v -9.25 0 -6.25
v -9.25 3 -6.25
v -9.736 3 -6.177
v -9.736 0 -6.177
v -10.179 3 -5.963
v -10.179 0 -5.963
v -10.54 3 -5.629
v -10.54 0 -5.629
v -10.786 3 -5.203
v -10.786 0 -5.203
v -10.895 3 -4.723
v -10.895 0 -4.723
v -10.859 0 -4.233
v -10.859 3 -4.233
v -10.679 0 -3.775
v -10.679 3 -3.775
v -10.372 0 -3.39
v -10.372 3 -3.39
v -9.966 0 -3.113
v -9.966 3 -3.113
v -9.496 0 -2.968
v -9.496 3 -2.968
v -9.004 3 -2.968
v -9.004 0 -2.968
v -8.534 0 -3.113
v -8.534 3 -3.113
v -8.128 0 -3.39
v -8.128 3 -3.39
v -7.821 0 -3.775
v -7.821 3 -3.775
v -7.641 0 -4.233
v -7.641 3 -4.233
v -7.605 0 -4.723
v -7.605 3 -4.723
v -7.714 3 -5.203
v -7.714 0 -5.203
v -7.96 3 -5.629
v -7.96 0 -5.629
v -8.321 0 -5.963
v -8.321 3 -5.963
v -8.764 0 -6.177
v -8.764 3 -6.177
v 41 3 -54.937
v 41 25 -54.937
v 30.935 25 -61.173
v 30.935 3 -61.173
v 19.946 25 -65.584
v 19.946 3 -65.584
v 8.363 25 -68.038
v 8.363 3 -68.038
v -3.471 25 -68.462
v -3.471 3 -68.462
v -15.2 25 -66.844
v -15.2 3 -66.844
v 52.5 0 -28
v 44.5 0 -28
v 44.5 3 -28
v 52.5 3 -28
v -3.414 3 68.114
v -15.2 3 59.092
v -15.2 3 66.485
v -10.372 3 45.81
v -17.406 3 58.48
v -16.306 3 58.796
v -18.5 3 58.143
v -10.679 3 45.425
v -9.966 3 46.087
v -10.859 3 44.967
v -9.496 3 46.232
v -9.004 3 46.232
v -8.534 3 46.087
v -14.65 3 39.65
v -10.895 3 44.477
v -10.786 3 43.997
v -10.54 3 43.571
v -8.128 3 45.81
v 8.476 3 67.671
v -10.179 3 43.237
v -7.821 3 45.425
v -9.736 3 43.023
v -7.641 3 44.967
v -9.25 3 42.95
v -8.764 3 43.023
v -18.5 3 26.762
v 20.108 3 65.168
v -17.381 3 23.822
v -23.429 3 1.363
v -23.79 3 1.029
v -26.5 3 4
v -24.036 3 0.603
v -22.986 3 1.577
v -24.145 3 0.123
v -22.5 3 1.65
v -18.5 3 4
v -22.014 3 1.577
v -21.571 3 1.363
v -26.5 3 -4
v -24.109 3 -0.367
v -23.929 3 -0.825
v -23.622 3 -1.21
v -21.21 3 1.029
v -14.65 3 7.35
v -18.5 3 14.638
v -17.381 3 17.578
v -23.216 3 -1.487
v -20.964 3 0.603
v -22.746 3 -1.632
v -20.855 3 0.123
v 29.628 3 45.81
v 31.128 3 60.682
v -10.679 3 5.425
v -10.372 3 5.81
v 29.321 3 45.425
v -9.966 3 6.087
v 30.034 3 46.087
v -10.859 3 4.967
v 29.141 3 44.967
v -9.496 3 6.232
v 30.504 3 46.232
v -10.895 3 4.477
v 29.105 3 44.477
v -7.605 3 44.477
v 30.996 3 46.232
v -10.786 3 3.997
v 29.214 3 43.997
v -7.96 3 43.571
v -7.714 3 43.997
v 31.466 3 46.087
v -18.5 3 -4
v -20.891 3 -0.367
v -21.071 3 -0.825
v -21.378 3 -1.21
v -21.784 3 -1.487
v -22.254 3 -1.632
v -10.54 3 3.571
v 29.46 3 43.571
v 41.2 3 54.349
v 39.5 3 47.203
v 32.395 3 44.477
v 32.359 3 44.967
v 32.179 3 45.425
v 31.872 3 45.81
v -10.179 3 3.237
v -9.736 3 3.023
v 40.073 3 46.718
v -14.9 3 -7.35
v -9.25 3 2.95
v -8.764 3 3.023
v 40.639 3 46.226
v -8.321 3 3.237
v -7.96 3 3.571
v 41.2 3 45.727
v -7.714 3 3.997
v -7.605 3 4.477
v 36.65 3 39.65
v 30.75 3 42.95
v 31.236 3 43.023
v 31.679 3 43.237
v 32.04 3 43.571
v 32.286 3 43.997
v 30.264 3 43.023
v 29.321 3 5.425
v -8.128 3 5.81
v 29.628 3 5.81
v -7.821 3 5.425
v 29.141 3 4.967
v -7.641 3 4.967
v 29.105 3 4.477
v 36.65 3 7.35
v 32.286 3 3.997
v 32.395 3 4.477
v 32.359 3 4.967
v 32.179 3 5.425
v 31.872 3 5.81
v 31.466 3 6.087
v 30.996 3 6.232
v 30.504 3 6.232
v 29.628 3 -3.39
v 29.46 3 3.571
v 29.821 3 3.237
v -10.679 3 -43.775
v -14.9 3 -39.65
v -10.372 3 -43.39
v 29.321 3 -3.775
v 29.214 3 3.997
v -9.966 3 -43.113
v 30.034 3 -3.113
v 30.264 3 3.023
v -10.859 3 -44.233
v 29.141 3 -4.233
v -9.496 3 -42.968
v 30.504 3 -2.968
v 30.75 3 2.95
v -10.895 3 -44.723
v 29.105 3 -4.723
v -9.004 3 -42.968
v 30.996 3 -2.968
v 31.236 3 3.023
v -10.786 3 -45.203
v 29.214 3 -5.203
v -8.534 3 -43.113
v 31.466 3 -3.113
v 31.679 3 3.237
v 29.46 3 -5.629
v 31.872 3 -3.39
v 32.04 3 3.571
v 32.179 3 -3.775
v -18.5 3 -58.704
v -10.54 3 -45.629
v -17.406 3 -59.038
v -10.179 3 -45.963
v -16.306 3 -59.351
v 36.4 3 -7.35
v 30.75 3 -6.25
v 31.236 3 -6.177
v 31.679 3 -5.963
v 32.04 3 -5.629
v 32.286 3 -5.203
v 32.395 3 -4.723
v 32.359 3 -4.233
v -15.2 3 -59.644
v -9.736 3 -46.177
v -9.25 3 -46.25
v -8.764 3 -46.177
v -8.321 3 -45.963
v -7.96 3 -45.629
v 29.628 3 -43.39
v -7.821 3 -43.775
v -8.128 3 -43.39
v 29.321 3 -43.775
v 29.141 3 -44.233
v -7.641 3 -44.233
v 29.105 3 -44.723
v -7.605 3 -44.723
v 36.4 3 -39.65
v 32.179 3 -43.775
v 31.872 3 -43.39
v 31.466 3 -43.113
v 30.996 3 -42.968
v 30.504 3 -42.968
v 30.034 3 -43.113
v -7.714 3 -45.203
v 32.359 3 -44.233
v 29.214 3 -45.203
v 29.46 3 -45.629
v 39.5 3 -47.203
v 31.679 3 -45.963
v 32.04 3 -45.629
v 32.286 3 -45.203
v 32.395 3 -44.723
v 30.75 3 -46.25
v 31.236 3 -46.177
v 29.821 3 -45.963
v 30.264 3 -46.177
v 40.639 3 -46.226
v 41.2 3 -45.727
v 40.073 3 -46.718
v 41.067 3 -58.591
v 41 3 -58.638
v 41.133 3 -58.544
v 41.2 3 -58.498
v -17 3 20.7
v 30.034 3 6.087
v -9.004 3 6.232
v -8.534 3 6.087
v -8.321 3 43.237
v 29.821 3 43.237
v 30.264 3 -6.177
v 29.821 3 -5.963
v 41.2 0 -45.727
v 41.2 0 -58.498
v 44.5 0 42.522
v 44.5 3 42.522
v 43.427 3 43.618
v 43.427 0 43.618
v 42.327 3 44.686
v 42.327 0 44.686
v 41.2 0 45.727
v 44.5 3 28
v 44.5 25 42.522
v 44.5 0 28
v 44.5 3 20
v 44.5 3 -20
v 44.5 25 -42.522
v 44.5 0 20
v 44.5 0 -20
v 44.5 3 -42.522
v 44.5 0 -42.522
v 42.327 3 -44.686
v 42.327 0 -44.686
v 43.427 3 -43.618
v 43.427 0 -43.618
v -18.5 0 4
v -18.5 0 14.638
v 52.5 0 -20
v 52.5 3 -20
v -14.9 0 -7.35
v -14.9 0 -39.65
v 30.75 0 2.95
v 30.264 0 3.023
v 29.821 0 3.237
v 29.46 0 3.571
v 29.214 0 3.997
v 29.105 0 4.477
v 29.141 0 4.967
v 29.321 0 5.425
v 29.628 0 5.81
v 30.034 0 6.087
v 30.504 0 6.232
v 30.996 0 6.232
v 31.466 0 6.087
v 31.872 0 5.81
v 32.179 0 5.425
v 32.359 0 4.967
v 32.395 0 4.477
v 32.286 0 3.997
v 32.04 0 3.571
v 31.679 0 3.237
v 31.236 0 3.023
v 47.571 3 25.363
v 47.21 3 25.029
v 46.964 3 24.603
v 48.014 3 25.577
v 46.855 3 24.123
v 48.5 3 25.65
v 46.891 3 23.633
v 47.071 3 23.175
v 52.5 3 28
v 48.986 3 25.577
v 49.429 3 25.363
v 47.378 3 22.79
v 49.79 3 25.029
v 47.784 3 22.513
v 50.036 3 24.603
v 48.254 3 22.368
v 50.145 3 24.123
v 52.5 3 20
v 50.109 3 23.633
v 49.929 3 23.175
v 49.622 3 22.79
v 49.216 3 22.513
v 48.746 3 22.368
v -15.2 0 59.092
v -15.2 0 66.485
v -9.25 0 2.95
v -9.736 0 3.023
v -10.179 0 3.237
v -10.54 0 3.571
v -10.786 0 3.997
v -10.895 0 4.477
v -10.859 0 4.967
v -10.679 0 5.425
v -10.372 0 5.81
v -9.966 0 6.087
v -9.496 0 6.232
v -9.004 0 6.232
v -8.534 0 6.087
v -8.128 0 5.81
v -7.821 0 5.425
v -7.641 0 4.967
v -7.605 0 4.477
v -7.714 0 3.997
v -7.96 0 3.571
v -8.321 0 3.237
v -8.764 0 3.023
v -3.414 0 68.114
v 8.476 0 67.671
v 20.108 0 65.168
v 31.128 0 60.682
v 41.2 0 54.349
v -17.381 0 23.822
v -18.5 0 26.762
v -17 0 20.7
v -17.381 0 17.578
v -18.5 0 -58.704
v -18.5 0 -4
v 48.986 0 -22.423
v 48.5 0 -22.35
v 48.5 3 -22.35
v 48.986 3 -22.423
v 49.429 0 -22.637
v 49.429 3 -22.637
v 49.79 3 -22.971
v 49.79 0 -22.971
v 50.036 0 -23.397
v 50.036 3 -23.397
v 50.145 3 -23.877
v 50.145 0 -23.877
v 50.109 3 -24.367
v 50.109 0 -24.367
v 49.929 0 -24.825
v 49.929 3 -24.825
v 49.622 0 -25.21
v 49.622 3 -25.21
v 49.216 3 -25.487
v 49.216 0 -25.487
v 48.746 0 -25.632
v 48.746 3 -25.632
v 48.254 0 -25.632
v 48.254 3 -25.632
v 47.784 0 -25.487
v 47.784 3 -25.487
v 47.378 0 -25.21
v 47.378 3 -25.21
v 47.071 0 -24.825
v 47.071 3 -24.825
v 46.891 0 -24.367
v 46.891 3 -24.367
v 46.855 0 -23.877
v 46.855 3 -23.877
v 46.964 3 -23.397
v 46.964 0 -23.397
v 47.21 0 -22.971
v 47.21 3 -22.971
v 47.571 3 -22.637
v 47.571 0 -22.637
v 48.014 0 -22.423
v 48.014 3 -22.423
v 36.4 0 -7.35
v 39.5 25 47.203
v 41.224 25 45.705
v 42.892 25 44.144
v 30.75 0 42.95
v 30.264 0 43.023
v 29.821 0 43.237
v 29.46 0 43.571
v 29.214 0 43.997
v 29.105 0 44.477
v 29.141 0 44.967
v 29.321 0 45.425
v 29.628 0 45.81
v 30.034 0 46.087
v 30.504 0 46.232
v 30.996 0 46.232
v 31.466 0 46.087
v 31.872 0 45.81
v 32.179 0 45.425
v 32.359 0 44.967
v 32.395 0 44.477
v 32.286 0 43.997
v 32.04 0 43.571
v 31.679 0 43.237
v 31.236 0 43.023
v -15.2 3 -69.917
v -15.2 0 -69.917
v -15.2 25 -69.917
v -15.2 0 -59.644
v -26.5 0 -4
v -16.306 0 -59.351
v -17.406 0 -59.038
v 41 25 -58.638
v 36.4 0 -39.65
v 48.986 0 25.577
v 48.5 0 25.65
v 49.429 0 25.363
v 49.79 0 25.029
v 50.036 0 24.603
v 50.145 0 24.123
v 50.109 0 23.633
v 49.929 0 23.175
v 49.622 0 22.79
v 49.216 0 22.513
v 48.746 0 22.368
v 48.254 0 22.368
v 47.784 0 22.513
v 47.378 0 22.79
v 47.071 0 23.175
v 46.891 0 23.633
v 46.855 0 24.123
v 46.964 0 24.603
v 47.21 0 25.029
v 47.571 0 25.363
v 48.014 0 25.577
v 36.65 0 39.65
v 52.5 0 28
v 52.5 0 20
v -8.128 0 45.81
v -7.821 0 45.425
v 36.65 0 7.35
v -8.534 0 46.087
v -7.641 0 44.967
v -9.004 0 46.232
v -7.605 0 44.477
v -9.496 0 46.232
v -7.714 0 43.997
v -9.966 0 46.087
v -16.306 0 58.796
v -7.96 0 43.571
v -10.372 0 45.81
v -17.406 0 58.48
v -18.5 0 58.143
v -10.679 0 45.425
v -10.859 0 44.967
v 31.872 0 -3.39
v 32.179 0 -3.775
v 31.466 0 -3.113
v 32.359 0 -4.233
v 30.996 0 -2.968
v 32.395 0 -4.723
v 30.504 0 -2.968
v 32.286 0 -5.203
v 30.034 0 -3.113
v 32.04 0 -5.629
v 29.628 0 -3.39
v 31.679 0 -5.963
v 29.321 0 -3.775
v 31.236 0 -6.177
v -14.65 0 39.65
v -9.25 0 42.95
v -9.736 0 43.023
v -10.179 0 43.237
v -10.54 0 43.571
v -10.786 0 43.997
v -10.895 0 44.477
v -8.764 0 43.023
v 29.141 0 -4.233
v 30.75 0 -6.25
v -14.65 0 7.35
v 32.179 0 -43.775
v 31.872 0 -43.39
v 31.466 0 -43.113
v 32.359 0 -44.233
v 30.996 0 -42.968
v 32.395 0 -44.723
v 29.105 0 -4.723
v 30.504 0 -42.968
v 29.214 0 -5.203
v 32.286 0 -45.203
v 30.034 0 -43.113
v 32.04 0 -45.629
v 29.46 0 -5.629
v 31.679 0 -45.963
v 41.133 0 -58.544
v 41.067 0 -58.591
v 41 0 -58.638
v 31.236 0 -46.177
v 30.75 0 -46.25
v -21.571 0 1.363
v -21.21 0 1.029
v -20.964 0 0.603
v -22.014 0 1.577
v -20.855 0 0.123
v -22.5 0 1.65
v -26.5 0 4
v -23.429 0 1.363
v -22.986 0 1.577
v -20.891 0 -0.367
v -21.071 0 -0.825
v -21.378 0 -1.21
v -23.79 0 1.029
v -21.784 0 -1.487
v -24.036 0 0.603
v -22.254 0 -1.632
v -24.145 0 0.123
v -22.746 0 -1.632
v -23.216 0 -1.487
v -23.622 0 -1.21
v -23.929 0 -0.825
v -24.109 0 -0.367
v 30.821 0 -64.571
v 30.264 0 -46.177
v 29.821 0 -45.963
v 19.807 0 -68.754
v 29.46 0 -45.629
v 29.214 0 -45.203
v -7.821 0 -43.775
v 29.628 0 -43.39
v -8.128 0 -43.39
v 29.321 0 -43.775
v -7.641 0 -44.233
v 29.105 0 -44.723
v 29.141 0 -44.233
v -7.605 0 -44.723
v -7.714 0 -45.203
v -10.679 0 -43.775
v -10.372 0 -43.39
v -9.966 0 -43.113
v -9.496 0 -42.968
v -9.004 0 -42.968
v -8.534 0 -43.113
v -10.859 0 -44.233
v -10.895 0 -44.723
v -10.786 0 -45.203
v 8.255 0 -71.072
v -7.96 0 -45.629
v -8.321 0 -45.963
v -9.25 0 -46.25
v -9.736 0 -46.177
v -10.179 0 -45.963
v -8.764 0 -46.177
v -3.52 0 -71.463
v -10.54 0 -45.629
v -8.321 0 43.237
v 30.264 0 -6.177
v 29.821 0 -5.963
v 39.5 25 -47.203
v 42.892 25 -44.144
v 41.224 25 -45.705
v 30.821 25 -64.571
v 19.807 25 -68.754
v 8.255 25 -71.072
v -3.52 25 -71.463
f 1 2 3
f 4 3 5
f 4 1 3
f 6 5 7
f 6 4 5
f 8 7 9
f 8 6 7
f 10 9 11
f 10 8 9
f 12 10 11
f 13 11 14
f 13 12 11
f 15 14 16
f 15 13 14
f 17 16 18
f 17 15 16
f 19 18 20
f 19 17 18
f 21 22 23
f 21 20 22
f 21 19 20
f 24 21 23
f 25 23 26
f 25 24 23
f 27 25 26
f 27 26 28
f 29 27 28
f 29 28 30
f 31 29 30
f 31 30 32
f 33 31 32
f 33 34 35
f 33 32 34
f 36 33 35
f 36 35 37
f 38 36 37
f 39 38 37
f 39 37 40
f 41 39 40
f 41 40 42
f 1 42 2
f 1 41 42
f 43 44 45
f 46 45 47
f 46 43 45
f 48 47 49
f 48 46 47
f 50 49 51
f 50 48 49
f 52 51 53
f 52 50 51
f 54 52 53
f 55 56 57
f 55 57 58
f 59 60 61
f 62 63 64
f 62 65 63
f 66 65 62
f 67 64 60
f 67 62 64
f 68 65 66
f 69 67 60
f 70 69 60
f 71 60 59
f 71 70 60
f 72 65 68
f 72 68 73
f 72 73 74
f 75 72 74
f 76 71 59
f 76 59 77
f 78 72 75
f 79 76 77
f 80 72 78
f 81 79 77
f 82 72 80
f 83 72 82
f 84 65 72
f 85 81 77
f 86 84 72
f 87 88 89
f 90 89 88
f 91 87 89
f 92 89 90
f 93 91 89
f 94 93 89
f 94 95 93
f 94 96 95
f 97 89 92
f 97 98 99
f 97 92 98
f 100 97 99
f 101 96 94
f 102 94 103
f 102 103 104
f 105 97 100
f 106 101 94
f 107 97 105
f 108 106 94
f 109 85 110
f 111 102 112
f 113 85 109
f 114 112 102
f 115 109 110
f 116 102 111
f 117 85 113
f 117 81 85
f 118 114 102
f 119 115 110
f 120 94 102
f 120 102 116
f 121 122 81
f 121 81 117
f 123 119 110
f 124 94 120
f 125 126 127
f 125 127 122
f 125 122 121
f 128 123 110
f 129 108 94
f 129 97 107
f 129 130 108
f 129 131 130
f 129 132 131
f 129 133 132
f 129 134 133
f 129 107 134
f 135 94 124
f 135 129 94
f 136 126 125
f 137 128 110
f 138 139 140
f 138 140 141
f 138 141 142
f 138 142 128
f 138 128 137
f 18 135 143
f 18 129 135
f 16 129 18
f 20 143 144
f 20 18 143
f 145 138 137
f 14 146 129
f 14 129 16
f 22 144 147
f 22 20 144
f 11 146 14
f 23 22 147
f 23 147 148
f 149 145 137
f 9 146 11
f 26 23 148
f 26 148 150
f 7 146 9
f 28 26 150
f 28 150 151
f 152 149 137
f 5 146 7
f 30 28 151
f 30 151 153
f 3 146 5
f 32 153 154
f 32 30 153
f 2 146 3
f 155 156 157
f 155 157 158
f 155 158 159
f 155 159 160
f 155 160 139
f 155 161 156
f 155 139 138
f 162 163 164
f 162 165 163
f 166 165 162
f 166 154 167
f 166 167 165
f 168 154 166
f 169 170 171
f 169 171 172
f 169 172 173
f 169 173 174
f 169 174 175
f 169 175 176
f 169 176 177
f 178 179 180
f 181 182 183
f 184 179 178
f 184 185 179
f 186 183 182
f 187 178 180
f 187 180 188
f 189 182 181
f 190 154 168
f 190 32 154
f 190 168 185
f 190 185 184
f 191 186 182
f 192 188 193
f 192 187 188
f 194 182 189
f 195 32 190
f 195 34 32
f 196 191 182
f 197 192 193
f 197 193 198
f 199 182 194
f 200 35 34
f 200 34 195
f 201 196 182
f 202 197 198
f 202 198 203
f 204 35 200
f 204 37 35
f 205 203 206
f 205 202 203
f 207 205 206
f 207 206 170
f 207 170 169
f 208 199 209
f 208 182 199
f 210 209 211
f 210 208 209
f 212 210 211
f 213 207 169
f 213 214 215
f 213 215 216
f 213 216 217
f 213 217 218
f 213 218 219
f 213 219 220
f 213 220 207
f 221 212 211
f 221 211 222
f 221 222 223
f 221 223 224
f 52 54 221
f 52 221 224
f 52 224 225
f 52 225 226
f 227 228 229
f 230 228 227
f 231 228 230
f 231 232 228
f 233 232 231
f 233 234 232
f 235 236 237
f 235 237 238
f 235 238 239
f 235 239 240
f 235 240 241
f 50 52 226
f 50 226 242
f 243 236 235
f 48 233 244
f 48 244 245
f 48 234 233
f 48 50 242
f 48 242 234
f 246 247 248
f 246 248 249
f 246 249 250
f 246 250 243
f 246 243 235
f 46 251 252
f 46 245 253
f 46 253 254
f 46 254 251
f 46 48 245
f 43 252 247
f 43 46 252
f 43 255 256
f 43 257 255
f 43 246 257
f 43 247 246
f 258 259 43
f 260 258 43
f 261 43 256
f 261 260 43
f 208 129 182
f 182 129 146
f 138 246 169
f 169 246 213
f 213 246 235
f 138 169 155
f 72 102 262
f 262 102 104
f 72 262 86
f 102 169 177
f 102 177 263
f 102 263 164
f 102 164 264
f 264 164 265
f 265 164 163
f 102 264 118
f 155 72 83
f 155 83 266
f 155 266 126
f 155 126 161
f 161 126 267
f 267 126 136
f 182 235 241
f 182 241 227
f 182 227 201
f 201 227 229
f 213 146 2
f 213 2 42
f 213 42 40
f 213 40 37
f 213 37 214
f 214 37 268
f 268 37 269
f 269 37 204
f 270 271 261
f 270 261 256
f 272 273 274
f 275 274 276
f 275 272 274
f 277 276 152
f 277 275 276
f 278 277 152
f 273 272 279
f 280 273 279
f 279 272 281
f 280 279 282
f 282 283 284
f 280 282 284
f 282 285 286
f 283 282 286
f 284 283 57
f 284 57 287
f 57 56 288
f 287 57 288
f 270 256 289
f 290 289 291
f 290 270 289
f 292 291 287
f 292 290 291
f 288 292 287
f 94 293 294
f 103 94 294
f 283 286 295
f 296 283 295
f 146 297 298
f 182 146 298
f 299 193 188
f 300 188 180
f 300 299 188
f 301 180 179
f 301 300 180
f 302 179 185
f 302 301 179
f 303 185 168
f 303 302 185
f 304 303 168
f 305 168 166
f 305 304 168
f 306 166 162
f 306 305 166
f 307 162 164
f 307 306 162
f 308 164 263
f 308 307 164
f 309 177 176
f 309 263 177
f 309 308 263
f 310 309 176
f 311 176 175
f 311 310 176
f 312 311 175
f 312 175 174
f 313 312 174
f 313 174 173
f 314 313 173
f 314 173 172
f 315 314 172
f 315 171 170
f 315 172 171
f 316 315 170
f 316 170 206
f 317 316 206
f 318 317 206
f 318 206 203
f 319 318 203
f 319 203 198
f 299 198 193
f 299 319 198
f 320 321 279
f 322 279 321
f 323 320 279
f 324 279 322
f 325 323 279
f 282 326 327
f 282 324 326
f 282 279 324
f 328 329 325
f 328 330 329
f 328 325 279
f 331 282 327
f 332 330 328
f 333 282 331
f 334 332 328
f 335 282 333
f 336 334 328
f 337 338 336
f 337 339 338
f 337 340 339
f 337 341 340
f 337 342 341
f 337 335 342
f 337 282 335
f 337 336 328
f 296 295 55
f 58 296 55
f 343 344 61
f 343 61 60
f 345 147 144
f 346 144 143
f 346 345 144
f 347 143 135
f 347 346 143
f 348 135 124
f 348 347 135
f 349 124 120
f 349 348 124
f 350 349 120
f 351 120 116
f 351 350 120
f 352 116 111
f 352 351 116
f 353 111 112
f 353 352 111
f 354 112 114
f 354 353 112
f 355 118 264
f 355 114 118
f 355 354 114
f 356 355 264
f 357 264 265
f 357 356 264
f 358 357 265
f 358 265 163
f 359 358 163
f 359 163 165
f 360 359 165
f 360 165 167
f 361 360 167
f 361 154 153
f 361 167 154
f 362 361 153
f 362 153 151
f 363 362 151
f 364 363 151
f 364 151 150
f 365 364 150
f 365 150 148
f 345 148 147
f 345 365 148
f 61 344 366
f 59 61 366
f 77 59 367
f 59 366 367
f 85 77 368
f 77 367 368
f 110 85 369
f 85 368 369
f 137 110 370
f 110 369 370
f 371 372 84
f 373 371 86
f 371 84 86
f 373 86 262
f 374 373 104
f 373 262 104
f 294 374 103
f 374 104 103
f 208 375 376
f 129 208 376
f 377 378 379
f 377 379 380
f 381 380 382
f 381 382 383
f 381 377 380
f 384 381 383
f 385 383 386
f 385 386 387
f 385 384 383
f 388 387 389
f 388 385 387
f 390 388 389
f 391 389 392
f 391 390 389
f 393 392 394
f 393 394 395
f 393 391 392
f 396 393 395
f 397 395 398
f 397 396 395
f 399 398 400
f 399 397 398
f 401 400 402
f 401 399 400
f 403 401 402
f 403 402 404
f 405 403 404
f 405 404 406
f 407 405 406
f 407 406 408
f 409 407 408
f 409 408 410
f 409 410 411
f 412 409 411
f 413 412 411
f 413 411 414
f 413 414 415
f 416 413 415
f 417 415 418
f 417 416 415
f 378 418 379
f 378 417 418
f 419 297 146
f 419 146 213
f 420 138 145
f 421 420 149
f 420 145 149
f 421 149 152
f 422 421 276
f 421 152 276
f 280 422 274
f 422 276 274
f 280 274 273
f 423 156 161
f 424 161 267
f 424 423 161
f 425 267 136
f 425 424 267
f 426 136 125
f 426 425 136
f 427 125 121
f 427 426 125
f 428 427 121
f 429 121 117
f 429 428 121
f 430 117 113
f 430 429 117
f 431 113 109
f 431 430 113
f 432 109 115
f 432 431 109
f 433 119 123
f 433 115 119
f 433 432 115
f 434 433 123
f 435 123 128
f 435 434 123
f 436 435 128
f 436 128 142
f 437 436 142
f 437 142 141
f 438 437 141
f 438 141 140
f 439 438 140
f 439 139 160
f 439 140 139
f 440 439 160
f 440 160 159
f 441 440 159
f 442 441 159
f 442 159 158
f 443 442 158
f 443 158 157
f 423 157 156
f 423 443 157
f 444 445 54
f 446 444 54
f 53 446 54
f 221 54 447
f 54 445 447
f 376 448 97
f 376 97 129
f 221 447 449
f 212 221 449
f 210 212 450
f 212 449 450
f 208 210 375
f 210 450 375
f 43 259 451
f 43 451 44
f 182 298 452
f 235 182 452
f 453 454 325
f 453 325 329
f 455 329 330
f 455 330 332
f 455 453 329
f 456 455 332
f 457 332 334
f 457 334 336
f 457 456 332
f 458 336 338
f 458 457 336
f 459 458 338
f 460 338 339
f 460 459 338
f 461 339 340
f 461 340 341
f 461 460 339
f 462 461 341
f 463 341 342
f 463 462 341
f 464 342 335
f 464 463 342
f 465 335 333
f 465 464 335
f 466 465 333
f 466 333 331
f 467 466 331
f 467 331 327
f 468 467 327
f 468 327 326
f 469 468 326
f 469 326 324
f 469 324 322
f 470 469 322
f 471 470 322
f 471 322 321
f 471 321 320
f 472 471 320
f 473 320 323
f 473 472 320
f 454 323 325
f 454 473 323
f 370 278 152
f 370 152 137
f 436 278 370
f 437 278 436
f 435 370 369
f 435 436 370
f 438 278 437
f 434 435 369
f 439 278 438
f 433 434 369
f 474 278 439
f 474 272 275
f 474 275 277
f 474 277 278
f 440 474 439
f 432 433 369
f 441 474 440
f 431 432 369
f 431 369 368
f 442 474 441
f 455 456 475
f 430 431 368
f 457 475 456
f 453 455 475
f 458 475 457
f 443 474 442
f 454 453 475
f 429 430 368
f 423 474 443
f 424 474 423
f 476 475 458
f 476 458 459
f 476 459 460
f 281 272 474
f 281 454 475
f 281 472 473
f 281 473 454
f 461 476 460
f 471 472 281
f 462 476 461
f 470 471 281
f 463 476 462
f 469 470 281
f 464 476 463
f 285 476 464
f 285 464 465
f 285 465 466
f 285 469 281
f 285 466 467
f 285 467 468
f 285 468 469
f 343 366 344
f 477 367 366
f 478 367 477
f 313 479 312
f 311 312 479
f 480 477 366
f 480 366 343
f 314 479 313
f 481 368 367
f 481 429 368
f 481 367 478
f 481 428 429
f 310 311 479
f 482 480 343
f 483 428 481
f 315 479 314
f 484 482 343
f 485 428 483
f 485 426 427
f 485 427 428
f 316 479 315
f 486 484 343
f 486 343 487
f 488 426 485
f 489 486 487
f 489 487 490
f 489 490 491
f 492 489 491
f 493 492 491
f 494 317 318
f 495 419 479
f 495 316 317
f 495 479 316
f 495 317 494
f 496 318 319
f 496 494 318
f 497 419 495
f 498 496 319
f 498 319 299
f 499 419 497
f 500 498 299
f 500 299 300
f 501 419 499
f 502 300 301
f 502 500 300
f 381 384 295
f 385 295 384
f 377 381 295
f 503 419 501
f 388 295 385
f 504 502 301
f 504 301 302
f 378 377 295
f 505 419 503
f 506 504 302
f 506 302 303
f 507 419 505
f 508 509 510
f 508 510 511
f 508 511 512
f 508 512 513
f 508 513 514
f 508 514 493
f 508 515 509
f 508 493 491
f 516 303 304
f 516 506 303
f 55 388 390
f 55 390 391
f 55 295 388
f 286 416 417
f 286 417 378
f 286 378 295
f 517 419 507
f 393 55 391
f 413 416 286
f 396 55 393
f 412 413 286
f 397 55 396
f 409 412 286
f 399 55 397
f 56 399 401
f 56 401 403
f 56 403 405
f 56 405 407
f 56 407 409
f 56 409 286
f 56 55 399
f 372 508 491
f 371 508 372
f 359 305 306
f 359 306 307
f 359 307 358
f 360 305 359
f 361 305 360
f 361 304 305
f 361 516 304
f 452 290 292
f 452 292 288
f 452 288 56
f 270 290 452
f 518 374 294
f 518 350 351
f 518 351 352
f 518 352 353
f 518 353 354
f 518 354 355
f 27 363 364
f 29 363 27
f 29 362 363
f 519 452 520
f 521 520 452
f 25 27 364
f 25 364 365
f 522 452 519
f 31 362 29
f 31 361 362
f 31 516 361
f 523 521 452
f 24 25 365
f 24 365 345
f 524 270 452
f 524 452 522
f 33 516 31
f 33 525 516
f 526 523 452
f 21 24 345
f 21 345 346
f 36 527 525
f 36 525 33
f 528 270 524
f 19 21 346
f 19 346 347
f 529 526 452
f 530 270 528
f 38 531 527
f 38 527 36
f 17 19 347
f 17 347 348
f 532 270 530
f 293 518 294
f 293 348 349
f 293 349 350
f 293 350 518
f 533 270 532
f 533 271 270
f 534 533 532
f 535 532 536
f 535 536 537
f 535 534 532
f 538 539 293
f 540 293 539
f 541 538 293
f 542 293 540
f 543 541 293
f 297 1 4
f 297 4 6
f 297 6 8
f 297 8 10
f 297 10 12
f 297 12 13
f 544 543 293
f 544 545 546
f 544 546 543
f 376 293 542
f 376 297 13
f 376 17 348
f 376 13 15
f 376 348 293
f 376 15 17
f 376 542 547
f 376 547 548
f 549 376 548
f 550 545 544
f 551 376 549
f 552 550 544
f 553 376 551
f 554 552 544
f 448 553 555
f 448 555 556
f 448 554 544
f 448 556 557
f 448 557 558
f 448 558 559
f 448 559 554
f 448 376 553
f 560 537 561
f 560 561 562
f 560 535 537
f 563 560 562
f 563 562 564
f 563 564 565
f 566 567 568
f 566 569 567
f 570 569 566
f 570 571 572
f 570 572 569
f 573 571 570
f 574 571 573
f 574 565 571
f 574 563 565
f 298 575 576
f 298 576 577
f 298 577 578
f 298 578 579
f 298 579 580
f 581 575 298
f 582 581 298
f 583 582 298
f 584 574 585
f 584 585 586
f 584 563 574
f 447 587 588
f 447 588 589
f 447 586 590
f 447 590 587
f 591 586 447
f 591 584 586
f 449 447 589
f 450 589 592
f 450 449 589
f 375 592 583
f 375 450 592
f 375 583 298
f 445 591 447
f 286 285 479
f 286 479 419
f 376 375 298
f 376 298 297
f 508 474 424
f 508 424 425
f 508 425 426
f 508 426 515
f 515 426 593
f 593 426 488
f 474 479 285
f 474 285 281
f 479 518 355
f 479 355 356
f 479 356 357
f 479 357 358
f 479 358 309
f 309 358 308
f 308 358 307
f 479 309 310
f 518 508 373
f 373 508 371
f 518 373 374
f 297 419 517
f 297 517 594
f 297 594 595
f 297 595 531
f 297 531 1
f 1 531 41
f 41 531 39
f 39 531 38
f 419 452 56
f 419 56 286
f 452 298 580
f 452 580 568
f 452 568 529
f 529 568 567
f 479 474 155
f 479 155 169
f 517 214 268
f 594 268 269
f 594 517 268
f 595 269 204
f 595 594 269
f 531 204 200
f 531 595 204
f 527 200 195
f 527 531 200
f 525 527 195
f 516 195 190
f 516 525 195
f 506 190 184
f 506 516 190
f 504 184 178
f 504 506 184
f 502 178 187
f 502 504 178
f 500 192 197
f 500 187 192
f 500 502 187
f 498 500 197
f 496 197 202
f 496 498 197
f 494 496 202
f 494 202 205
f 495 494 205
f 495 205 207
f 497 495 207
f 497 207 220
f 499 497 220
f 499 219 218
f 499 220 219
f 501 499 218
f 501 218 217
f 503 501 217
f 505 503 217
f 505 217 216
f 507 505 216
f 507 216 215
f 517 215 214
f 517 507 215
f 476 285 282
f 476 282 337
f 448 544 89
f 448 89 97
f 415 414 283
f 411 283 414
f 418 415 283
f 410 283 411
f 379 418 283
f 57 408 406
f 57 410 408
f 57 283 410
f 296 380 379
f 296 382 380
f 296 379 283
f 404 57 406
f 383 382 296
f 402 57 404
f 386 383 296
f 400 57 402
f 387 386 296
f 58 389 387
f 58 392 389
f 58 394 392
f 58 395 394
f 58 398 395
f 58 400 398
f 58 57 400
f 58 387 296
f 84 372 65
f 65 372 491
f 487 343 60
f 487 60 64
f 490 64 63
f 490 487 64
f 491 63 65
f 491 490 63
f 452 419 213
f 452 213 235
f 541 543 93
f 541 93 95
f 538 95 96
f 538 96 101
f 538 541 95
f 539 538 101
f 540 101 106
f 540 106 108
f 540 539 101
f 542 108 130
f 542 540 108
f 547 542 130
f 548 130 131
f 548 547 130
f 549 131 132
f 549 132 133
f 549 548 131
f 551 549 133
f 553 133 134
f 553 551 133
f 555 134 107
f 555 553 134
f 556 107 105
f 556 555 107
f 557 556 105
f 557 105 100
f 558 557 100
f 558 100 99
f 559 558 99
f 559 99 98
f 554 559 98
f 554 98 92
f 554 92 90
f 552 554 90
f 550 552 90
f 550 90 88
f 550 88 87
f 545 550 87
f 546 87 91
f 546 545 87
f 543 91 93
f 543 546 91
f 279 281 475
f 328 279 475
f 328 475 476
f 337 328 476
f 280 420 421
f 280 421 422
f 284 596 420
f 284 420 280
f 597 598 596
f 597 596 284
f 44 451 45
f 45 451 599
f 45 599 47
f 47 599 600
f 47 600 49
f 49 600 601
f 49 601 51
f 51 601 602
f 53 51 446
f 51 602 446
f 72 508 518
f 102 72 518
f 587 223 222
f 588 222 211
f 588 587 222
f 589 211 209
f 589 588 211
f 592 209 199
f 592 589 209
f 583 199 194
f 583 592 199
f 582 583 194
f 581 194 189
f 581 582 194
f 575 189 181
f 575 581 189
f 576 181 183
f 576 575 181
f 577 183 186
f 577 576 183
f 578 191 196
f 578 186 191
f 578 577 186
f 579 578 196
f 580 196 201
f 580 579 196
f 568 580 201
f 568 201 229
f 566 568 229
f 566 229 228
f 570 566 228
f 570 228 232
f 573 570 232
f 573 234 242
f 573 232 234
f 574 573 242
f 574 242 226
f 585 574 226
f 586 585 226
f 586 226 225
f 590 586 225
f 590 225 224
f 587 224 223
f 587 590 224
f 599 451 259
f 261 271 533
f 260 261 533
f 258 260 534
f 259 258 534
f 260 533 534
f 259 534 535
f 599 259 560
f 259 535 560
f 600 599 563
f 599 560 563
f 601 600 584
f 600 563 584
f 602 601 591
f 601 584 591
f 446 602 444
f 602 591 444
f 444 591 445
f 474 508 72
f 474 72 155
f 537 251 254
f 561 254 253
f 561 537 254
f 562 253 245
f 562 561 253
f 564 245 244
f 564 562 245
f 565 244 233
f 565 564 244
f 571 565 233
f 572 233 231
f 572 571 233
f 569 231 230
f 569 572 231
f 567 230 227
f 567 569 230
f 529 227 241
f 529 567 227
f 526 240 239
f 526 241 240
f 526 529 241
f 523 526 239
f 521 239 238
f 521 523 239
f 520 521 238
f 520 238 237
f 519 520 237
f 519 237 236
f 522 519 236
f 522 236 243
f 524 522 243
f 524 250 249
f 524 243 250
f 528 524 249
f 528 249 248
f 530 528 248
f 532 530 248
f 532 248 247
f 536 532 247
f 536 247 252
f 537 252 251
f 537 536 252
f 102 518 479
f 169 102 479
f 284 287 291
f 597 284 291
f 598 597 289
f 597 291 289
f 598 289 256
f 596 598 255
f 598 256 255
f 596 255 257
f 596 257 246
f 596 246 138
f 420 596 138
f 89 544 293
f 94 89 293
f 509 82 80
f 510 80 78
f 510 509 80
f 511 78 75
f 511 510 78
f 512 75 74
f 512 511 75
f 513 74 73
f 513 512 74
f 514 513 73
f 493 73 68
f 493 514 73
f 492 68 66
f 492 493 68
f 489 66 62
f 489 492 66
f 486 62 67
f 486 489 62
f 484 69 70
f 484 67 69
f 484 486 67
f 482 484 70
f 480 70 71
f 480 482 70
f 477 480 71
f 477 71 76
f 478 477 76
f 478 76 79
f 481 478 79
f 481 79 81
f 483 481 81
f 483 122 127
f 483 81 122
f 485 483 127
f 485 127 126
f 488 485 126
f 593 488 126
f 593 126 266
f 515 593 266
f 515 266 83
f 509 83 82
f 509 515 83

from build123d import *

# Parameters (mm, degrees)
SKETCH1_W           = 8
SKETCH1_H           = 8
SKETCH1_R           = 1.65
BOSS_EXTRUDE1_DEPTH = 3
BOSS_EXTRUDE2_DEPTH = 22
SKETCH3_R           = 13
CUT_EXTRUDE1_DEPTH  = 92.431135288
CUT_EXTRUDE3_DEPTH  = 3
SKETCH6_R           = 1.65
SKETCH6_W           = 51.3
SKETCH6_H           = 32.3
CUT_EXTRUDE4_DEPTH  = 93.198983183
BOSS_EXTRUDE4_DEPTH = 25
CUT_EXTRUDE5_DEPTH  = 93.198983183


# Read off the part's stored shape, not the designer's step: Cut-Extrude3
with BuildPart() as part:
    # Sketch1 → Boss-Extrude1 (new body)
    # profile 1 of 4: a face of its own
    with BuildSketch(Plane(origin=(0, 0, 0), x_dir=(1, 0, 0), z_dir=(0, 1, 0))):
        with BuildLine():
            Line((-18.5, 69.116947994), (-18.5, 4))
            Line((-18.5, 4), (-18.5, -4))
            Line((-18.5, -4), (-18.5, -65.642897559))
            ThreePointArc((-18.5, -65.642897559), (14.755653403, -66.584613032), (44.5, -51.681621492))
            Line((44.5, -51.681621492), (44.5, -28))
            Line((44.5, -28), (44.5, -20))
            Line((44.5, -20), (44.5, 20))
            Line((44.5, 20), (44.5, 28))
            Line((44.5, 28), (44.5, 55))
            Line((44.5, 55), (44.5, 56.028140251))
            ThreePointArc((44.5, 56.028140251), (14.554354058, 70.054073957), (-18.5, 69.116947994))
        make_face()
    # profile 2 of 4: a face of its own
    with BuildSketch(Plane(origin=(0, 0, 0), x_dir=(1, 0, 0), z_dir=(0, 1, 0))):
        with Locations((-22.5, 0)):
            Rectangle(SKETCH1_W, SKETCH1_H)
        with Locations(Location((-22.5, 0, 0), (0, 0, 270))):
            Circle(SKETCH1_R, mode=Mode.SUBTRACT)
    # profile 3 of 4: a face of its own
    with BuildSketch(Plane(origin=(0, 0, 0), x_dir=(1, 0, 0), z_dir=(0, 1, 0))):
        with Locations((48.5, -24)):
            Rectangle(SKETCH1_W, SKETCH1_H)
        with Locations(Location((48.5, -24, 0), (0, 0, 270))):
            Circle(SKETCH1_R, mode=Mode.SUBTRACT)
    # profile 4 of 4: a face of its own
    with BuildSketch(Plane(origin=(0, 0, 0), x_dir=(1, 0, 0), z_dir=(0, 1, 0))):
        with Locations((48.5, 24)):
            Rectangle(SKETCH1_W, SKETCH1_H)
        with Locations(Location((48.5, 24, 0), (0, 0, 270))):
            Circle(SKETCH1_R, mode=Mode.SUBTRACT)
    extrude(amount=BOSS_EXTRUDE1_DEPTH)

    # Sketch2 → Boss-Extrude2 (add)
    with BuildSketch(Plane(origin=(0, 3, 0), x_dir=(1, 0, 0), z_dir=(0, 1, 0))):
        with BuildLine():
            Line((44.5, -42.522376462), (44.5, 42.522376462))
            ThreePointArc((44.5, 42.522376462), (42.065161183, 44.932446124), (39.5, 47.203310265))
            Line((39.5, 47.203310265), (39.5, -47.203310265))
            ThreePointArc((39.5, -47.203310265), (42.065161183, -44.932446124), (44.5, -42.522376462))
        make_face()
    extrude(amount=BOSS_EXTRUDE2_DEPTH)

    # Sketch3 → Cut-Extrude1 (cut, through all)
    with BuildSketch(Plane(origin=(0, 3, 0), x_dir=(1, 0, 0), z_dir=(0, 1, 0))):
        with Locations((-30, -20.7)):
            Circle(SKETCH3_R)
    extrude(amount=-CUT_EXTRUDE1_DEPTH, mode=Mode.SUBTRACT)

    # Cut-Extrude3 outline → Cut-Extrude3 (cut)
    with BuildSketch(Plane(origin=(0, 0, 0), x_dir=(1, 0, 0), z_dir=(0, 1, 0))):
        with BuildLine():
            Line((44.5, -51.681621492), (44.5, -42.522376462))
            ThreePointArc((44.5, -42.522376462), (42.879948374, -44.155549226), (41.2, -45.727043421))
            Line((41.2, -45.727043421), (41.2, -54.348873033))
            ThreePointArc((41.2, -54.348873033), (42.870748276, -53.040917623), (44.5, -51.681621492))
        make_face()
        with BuildLine():
            ThreePointArc((41.2, 45.727043421), (42.879948374, 44.155549226), (44.5, 42.522376462))
            Line((44.5, 42.522376462), (44.5, 56.028140251))
            ThreePointArc((44.5, 56.028140251), (42.867784957, 57.286608495), (41.2, 58.497542683))
            Line((41.2, 58.497542683), (41.2, 45.727043421))
        make_face()
        with BuildLine():
            ThreePointArc((-18.5, -65.642897559), (-16.85525465, -66.084343007), (-15.2, -66.484584679))
            Line((-15.2, -66.484584679), (-15.2, -59.091509852))
            ThreePointArc((-15.2, -59.091509852), (-16.856674237, -58.640421812), (-18.5, -58.142897559))
            Line((-18.5, -58.142897559), (-18.5, -65.642897559))
        make_face()
    extrude(amount=CUT_EXTRUDE3_DEPTH, mode=Mode.SUBTRACT)

    # Sketch6 → Cut-Extrude4 (cut, through all)
    with BuildSketch(Plane(origin=(0, 0, 0), x_dir=(1, 0, 0), z_dir=(0, 1, 0))):
        with Locations(Location((-9.25, 44.6, 0), (0, 0, 90))):
            Circle(SKETCH6_R)
        with Locations(Location((-9.25, 4.6, 0), (0, 0, 90))):
            Circle(SKETCH6_R)
        with Locations(Location((30.75, 4.6, 0), (0, 0, 90))):
            Circle(SKETCH6_R)
        with Locations(Location((30.75, 44.6, 0), (0, 0, 90))):
            Circle(SKETCH6_R)
        with Locations(Location((-9.25, -4.6, 0), (0, 0, 90))):
            Circle(SKETCH6_R)
        with Locations(Location((30.75, -4.6, 0), (0, 0, 90))):
            Circle(SKETCH6_R)
        with Locations(Location((30.75, -44.6, 0), (0, 0, 90))):
            Circle(SKETCH6_R)
        with Locations(Location((-9.25, -44.6, 0), (0, 0, 90))):
            Circle(SKETCH6_R)
        with Locations((10.75, 23.5)):
            Rectangle(SKETCH6_W, SKETCH6_H)
        with Locations((11, -23.5)):
            Rectangle(SKETCH6_W, SKETCH6_H)
    extrude(amount=CUT_EXTRUDE4_DEPTH, mode=Mode.SUBTRACT)

    # Sketch8 → Boss-Extrude4 (add)
    with BuildSketch(Plane(origin=(0, 0, 0), x_dir=(1, 0, 0), z_dir=(0, 1, 0))):
        with BuildLine():
            Line((41, 58.637893039), (41, 54.93725967))
            ThreePointArc((41, 54.93725967), (14.207393879, 67.061557238), (-15.2, 66.843567379))
            Line((-15.2, 66.843567379), (-15.2, 69.916825586))
            ThreePointArc((-15.2, 69.916825586), (14.078834464, 70.151186164), (41, 58.637893039))
        make_face()
    extrude(amount=BOSS_EXTRUDE4_DEPTH)

    # Sketch9 → Cut-Extrude5 (cut, through all)
    with BuildSketch(Plane(origin=(0, 0, 0), x_dir=(1, 0, 0), z_dir=(0, 1, 0))):
        with BuildLine():
            Line((-18.5, 58.703939391), (-18.5, 74.933190401))
            Line((-18.5, 74.933190401), (-15.2, 74.933190401))
            Line((-15.2, 74.933190401), (-15.2, 59.643629165))
            ThreePointArc((-15.2, 59.643629165), (-16.856549297, 59.196784083), (-18.5, 58.703939391))
        make_face()
    extrude(amount=CUT_EXTRUDE5_DEPTH, mode=Mode.SUBTRACT)


solid = part.part
